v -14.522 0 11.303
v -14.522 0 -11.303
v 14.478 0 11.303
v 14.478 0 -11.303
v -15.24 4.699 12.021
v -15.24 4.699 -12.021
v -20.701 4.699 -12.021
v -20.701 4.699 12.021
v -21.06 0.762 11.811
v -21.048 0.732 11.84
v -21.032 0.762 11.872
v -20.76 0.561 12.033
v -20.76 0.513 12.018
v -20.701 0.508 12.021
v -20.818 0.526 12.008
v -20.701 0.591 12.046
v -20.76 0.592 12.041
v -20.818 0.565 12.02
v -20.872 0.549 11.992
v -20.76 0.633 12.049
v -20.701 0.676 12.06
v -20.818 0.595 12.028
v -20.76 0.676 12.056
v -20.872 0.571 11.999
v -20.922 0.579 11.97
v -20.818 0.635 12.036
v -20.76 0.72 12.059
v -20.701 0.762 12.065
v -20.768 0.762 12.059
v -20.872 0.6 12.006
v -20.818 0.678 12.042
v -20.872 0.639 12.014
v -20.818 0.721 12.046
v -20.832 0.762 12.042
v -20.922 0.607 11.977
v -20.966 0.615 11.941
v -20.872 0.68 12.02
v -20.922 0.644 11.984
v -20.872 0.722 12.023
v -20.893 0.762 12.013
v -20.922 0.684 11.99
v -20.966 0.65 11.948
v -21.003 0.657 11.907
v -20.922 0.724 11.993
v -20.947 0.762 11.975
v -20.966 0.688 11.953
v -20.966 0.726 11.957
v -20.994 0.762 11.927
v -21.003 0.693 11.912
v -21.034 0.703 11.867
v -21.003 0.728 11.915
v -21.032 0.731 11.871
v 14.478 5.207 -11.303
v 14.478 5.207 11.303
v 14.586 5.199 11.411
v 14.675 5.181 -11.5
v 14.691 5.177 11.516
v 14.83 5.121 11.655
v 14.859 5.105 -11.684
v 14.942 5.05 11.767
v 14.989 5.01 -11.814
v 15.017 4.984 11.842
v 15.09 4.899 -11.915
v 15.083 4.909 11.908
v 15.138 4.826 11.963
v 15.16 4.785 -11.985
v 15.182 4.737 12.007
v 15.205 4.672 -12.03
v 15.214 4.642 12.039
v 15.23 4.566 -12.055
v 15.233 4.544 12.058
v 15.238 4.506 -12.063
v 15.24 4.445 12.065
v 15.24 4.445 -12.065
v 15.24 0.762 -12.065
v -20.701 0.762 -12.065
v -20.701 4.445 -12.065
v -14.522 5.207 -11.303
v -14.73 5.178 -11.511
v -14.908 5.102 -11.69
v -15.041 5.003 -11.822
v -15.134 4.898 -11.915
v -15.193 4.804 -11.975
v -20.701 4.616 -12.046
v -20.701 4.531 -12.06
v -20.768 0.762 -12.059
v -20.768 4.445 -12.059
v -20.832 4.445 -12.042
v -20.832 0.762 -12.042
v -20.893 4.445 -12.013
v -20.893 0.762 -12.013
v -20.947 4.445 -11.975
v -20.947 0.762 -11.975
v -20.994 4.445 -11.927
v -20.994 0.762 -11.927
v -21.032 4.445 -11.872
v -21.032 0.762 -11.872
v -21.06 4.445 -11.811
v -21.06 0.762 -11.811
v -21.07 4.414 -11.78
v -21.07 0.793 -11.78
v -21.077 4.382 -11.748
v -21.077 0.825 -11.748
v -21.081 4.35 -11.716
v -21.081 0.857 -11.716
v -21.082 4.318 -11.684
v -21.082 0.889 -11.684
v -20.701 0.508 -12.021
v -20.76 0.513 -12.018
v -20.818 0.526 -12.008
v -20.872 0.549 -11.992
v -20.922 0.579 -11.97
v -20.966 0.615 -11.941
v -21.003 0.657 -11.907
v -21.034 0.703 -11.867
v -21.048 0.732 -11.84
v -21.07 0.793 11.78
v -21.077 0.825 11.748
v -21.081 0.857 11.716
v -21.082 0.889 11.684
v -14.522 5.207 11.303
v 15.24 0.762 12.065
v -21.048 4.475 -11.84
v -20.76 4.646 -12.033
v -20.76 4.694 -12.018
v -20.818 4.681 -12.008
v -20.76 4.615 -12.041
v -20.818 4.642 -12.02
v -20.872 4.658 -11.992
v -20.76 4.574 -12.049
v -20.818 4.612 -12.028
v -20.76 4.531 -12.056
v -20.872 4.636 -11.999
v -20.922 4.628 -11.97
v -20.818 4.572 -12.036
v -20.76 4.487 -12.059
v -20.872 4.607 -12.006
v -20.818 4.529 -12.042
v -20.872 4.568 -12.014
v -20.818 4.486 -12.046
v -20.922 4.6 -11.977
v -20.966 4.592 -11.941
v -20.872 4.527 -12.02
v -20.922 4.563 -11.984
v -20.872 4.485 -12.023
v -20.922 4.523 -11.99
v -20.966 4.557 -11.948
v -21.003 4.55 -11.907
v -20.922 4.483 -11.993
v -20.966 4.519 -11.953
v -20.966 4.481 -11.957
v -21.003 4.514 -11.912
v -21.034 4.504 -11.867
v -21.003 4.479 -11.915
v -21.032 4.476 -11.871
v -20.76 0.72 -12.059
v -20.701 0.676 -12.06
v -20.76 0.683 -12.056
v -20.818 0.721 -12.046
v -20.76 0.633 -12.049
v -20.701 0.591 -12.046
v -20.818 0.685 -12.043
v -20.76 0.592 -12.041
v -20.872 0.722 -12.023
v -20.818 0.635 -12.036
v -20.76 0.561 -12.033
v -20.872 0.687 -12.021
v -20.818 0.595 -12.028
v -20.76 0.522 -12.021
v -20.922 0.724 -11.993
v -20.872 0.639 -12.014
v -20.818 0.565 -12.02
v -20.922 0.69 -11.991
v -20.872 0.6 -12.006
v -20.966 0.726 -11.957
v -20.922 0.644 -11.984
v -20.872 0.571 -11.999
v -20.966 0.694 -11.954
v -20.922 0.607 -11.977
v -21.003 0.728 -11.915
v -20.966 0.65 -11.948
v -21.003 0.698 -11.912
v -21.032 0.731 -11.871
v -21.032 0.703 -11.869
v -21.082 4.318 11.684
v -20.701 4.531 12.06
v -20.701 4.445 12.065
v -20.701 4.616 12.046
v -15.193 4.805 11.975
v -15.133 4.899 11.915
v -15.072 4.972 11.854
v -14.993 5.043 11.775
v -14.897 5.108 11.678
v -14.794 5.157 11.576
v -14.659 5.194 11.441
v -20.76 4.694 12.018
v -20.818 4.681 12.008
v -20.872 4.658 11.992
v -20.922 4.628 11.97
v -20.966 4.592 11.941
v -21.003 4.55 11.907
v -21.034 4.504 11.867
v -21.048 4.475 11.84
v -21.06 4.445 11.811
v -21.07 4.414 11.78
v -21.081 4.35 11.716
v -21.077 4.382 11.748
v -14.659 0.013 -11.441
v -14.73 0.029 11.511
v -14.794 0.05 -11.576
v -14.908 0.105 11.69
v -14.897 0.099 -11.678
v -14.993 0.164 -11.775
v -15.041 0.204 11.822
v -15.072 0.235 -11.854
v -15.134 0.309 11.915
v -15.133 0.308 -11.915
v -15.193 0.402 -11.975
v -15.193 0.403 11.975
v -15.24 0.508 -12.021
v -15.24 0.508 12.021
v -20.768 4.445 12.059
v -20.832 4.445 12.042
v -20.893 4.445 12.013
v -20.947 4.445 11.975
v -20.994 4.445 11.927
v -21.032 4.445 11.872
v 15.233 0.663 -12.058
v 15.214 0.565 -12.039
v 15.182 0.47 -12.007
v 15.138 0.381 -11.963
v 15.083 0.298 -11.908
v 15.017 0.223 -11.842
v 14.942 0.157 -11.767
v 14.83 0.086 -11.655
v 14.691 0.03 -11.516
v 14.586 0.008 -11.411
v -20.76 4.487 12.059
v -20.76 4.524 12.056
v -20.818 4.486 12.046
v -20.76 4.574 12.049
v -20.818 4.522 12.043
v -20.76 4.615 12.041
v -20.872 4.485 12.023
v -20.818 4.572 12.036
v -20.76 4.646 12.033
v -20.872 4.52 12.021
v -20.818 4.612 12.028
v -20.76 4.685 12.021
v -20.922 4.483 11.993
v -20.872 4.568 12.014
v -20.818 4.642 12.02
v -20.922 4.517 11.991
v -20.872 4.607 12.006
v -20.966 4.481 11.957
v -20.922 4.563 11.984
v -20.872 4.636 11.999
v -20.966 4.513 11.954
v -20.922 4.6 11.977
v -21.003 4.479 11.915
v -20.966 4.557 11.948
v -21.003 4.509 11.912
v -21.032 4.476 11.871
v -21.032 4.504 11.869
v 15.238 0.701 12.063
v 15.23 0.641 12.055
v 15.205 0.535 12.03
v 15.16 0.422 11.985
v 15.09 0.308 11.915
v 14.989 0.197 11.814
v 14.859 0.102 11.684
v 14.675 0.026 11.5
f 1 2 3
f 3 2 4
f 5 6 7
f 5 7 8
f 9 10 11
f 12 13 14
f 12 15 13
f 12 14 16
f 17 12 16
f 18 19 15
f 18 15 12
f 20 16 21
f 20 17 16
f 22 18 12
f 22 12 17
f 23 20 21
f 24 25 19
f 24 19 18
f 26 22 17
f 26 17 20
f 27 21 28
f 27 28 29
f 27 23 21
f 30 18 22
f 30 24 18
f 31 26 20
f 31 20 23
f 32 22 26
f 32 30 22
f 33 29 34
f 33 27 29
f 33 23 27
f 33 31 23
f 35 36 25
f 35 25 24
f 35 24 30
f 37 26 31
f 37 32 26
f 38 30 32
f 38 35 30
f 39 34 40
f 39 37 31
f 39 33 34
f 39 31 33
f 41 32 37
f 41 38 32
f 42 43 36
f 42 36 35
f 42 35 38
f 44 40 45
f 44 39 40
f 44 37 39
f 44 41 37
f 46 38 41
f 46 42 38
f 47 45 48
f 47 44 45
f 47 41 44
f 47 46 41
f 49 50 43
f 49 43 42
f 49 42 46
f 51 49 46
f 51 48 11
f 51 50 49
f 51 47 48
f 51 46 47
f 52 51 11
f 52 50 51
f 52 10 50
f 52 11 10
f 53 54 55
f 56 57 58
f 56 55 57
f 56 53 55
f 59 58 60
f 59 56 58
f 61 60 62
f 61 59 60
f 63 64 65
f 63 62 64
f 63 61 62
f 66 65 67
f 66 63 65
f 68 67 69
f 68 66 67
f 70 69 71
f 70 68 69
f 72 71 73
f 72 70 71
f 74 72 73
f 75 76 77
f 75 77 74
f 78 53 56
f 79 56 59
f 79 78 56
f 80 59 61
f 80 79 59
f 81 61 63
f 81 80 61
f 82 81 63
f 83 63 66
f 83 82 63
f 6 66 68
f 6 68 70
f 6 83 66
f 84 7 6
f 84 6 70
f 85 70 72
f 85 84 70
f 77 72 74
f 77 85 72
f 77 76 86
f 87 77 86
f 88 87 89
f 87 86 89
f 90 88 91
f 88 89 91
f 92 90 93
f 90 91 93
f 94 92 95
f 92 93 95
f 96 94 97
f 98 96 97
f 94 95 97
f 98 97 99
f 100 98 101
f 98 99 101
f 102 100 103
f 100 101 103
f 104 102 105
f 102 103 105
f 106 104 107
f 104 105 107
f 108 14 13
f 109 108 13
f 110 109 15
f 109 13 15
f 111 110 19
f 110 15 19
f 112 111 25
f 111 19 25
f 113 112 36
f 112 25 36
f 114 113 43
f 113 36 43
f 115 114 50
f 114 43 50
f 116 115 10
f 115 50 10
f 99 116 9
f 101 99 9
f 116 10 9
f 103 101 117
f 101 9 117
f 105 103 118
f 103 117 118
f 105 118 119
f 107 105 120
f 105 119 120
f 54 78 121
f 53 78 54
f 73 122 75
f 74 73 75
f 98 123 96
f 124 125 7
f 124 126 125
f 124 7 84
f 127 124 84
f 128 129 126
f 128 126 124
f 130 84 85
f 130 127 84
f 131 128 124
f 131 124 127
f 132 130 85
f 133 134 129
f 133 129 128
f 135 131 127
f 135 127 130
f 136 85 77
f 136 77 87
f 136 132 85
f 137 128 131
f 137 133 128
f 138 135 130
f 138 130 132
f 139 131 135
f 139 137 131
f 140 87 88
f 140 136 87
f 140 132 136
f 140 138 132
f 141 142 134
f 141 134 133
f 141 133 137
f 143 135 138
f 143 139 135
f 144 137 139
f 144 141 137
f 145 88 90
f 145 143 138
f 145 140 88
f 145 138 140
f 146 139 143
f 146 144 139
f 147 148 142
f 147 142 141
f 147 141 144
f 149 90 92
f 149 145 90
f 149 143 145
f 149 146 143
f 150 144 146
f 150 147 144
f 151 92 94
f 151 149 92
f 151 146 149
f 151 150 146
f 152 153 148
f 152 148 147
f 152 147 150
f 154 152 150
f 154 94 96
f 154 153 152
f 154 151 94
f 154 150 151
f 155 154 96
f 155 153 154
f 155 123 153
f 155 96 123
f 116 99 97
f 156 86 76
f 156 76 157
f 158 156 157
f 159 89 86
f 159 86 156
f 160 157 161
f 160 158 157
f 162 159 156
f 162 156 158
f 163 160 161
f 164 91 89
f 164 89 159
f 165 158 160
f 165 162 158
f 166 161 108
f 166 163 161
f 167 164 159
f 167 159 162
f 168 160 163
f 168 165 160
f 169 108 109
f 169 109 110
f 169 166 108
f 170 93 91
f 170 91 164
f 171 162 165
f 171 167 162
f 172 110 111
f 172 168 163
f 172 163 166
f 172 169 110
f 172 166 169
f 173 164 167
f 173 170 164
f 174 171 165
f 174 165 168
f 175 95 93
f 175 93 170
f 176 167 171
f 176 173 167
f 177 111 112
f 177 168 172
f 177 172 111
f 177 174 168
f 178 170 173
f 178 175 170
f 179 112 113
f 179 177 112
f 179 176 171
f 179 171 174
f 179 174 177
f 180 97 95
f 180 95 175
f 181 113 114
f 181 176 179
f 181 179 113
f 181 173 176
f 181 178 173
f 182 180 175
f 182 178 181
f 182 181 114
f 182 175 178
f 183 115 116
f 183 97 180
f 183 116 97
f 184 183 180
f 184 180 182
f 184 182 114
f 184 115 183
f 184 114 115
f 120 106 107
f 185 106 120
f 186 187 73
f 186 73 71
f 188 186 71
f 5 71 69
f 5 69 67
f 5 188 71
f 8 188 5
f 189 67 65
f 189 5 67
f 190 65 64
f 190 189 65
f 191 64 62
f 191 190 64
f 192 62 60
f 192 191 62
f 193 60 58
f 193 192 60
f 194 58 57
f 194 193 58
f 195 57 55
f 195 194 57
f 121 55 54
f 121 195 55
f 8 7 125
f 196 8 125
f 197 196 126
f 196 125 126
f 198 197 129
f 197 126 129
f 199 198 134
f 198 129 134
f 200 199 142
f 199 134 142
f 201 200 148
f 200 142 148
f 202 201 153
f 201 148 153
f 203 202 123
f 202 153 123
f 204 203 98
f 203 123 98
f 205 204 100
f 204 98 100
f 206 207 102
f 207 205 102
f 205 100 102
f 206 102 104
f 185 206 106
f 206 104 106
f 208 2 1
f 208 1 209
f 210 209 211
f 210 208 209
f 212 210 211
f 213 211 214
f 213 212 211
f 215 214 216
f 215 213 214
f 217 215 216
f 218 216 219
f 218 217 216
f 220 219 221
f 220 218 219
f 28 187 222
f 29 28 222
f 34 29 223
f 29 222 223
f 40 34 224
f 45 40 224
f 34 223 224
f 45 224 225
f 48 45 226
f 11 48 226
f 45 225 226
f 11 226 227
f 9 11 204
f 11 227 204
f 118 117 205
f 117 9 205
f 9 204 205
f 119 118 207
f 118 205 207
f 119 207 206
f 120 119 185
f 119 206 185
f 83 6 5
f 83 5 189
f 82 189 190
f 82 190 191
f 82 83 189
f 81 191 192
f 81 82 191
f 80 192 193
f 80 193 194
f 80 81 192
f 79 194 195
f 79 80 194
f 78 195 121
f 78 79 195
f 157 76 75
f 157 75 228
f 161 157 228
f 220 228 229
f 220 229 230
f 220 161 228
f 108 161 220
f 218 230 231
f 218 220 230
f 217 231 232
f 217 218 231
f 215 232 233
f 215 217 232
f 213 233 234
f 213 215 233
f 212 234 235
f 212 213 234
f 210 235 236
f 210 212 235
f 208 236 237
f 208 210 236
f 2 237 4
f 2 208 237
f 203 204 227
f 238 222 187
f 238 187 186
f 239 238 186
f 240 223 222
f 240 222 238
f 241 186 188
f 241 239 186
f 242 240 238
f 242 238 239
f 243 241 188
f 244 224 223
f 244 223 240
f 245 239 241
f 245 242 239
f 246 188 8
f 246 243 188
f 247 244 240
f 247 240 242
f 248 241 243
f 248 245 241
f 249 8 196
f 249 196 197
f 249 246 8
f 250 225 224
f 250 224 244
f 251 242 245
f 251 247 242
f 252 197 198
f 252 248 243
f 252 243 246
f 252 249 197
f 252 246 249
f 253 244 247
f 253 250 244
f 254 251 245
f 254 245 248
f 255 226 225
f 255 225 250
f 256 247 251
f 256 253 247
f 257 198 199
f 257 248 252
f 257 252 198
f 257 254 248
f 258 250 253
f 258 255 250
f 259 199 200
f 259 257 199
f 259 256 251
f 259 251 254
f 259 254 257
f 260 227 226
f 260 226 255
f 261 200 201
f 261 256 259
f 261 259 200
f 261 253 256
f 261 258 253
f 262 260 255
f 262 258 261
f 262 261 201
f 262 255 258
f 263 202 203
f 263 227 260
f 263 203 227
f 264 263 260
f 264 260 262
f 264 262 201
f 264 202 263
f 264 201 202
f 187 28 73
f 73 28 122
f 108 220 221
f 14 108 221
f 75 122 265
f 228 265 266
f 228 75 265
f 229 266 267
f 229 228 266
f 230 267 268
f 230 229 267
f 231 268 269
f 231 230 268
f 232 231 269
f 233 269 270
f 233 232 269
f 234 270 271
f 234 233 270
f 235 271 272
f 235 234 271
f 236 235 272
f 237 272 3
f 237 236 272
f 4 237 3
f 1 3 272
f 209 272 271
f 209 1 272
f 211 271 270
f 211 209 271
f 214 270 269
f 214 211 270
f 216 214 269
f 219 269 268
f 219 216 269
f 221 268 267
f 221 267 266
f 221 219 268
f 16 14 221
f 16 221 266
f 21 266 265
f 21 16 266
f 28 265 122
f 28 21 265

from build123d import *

# Parameters (mm, degrees)
SKETCH1_W           = 30.48
SKETCH1_H           = 24.13
BOSS_EXTRUDE1_DEPTH = 5.207
SKETCH2_W           = 24.13
SKETCH2_H           = 4.191
BOSS_EXTRUDE2_DEPTH = 5.842
FILLET5_START       = -22
FILLET5_DEPTH       = 37.24
FILLET5_START_2     = -13
FILLET5_2_DEPTH     = 26
FILLET4_R           = 0.381


with BuildPart() as part:
    # Sketch1 → Boss-Extrude1 (new body)
    with BuildSketch(Plane(origin=(0, 0, 0), x_dir=(1, 0, 0), z_dir=(0, 1, 0))):
        Rectangle(SKETCH1_W, SKETCH1_H)
    extrude(amount=BOSS_EXTRUDE1_DEPTH)

    # Sketch2 → Boss-Extrude2 (add)
    with BuildSketch(Plane.ZY.offset(15.24)):
        with Locations((0, 2.6035)):
            Rectangle(SKETCH2_W, SKETCH2_H)
    extrude(amount=BOSS_EXTRUDE2_DEPTH)

    # Fillet5: read off the stored shape, not the designer's step
    # Fillet5 outline → Fillet5 (cut)
    with BuildSketch(Plane.YZ.offset(FILLET5_START)):
        with BuildLine():
            Line((4.445, -12.065), (5.207, -12.065))
            Line((5.207, -12.065), (5.207, -11.303))
            ThreePointArc((5.207, -11.303), (4.983815367, -11.841815367), (4.445, -12.065))
        make_face()
        with BuildLine():
            ThreePointArc((0.762, -12.065), (0.223184633, -11.841815367), (0, -11.303))
            Line((0, -11.303), (0, -12.065))
            Line((0, -12.065), (0.762, -12.065))
        make_face()
        with BuildLine():
            Line((5.207, 12.065), (4.445, 12.065))
            ThreePointArc((4.445, 12.065), (4.983815367, 11.841815367), (5.207, 11.303))
            Line((5.207, 11.303), (5.207, 12.065))
        make_face()
        with BuildLine():
            Line((0.762, 12.065), (0, 12.065))
            Line((0, 12.065), (0, 11.303))
            ThreePointArc((0, 11.303), (0.223184633, 11.841815367), (0.762, 12.065))
        make_face()
    extrude(amount=FILLET5_DEPTH, mode=Mode.SUBTRACT)

    # Fillet5 2 outline → Fillet5 2 (cut)
    with BuildSketch(Plane.XY.offset(FILLET5_START_2)):
        with BuildLine():
            Line((-15.24, 5.207), (-15.24, 4.699))
            ThreePointArc((-15.24, 4.699), (-14.961520415, 5.067170395), (-14.52157951, 5.207))
            Line((-14.52157951, 5.207), (-15.24, 5.207))
        make_face()
        with BuildLine():
            Line((-15.24, 0), (-14.52157951, 0))
            ThreePointArc((-14.52157951, 0), (-14.961520415, 0.139829605), (-15.24, 0.508))
            Line((-15.24, 0.508), (-15.24, 0))
        make_face()
        with BuildLine():
            Line((15.24, 0), (15.24, 0.762))
            ThreePointArc((15.24, 0.762), (15.016815367, 0.223184633), (14.478, 0))
            Line((14.478, 0), (15.24, 0))
        make_face()
        with BuildLine():
            Line((15.24, 5.207), (14.478, 5.207))
            ThreePointArc((14.478, 5.207), (15.016815367, 4.983815367), (15.24, 4.445))
            Line((15.24, 4.445), (15.24, 5.207))
        make_face()
    extrude(amount=FILLET5_2_DEPTH, mode=Mode.SUBTRACT)

    # Fillet4
    # the kernel refuses this fillet: 0.381 mm, written as the material it takes off along each edge
    with BuildSketch(Plane(origin=(-21.082, 0.762, -12.065), x_dir=(1, 0, 0), z_dir=(0, 1, 0))) as fillet4_piece_1:
        with BuildLine():
            CenterArc((FILLET4_R, -FILLET4_R), FILLET4_R, 90, 90)
            Line((0, -FILLET4_R), (0, 0))
            Line((0, 0), (FILLET4_R, 0))
        make_face()
    extrude(amount=3.683, mode=Mode.SUBTRACT)
    with BuildSketch(Plane(origin=(-21.082, 4.445, 12.065), x_dir=(0, 0, -1), z_dir=(0, -1, 0))) as fillet4_piece_2:
        with BuildLine():
            CenterArc((FILLET4_R, FILLET4_R), FILLET4_R, 180, 90)
            Line((0, FILLET4_R), (0, 0))
            Line((0, 0), (FILLET4_R, 0))
        make_face()
    extrude(amount=3.683, mode=Mode.SUBTRACT)
    with BuildSketch(Plane(origin=(-21.082, 0.508, 12.973920489), x_dir=(0, 1, 0), z_dir=(0, 0, -1)), Plane(origin=(-21.082, 4.699, -12.973920489), x_dir=(0, -1, 0), z_dir=(0, 0, 1))) as fillet4_piece_3:
        with BuildLine():
            CenterArc((FILLET4_R, FILLET4_R), FILLET4_R, 180, 90)
            Line((0, FILLET4_R), (0, 0))
            Line((0, 0), (FILLET4_R, 0))
        make_face()
    extrude(amount=25.947840979, mode=Mode.SUBTRACT)
    with BuildSketch(Plane(origin=(-21.082, 4.444999999, 11.302999999), x_dir=(0, 1.1835443663887322e-09, 1.0), z_dir=(0, -1.0, 1.1835443663887322e-09))) as fillet4_piece_4:
        with BuildLine():
            CenterArc((0.762000001 - FILLET4_R, -FILLET4_R), FILLET4_R, 0, 90)
            Line((0.762000001, -FILLET4_R), (0.762000001, 0))
            Line((0.762000001, 0), (0.762000001 - FILLET4_R, 0))
        make_face()
    revolve(axis=Axis((-21.082, 4.444999999, 11.302999999), (-1, 0, 0)), revolution_arc=91.092291179, mode=Mode.SUBTRACT)
    with BuildSketch(Plane(origin=(-21.082, 0.762000001, 11.302999999), x_dir=(0, -0.9998182859562426, -0.019062923897481165), z_dir=(0, 0.019062923897481165, -0.9998182859562426))) as fillet4_piece_5:
        with BuildLine():
            CenterArc((0.762000001 - FILLET4_R, -FILLET4_R), FILLET4_R, 0, 90)
            Line((0.762000001, -FILLET4_R), (0.762000001, 0))
            Line((0.762000001, 0), (0.762000001 - FILLET4_R, 0))
        make_face()
    revolve(axis=Axis((-21.082, 0.762000001, 11.302999999), (-1, 0, 0)), revolution_arc=91.092291179, mode=Mode.SUBTRACT)
    with BuildSketch(Plane(origin=(-21.082, 0.762000001, -11.302999999), x_dir=(0, -1.1835437835944942e-09, -1.0), z_dir=(0, 1.0, -1.1835437835944942e-09))) as fillet4_piece_6:
        with BuildLine():
            CenterArc((0.762000001 - FILLET4_R, -FILLET4_R), FILLET4_R, 360, 90)
            Line((0.762000001, -FILLET4_R), (0.762000001, 0))
            Line((0.762000001, 0), (0.762000001 - FILLET4_R, 0))
        make_face()
    revolve(axis=Axis((-21.082, 0.762000001, -11.302999999), (-1, 0, 0)), revolution_arc=91.092291179, mode=Mode.SUBTRACT)
    with BuildSketch(Plane(origin=(-21.082, 4.444999999, -11.302999999), x_dir=(0, 0.9998182859562423, 0.019062923897497485), z_dir=(0, -0.019062923897497485, 0.9998182859562423))) as fillet4_piece_7:
        with BuildLine():
            CenterArc((0.762000001 - FILLET4_R, -FILLET4_R), FILLET4_R, 0, 90)
            Line((0.762000001 - FILLET4_R, 0), (0.762000001, 0))
            Line((0.762000001, 0), (0.762000001, -FILLET4_R))
        make_face()
    revolve(axis=Axis((-21.082, 4.444999999, -11.302999999), (-1, 0, 0)), revolution_arc=91.092291179, mode=Mode.SUBTRACT)


solid = part.part
